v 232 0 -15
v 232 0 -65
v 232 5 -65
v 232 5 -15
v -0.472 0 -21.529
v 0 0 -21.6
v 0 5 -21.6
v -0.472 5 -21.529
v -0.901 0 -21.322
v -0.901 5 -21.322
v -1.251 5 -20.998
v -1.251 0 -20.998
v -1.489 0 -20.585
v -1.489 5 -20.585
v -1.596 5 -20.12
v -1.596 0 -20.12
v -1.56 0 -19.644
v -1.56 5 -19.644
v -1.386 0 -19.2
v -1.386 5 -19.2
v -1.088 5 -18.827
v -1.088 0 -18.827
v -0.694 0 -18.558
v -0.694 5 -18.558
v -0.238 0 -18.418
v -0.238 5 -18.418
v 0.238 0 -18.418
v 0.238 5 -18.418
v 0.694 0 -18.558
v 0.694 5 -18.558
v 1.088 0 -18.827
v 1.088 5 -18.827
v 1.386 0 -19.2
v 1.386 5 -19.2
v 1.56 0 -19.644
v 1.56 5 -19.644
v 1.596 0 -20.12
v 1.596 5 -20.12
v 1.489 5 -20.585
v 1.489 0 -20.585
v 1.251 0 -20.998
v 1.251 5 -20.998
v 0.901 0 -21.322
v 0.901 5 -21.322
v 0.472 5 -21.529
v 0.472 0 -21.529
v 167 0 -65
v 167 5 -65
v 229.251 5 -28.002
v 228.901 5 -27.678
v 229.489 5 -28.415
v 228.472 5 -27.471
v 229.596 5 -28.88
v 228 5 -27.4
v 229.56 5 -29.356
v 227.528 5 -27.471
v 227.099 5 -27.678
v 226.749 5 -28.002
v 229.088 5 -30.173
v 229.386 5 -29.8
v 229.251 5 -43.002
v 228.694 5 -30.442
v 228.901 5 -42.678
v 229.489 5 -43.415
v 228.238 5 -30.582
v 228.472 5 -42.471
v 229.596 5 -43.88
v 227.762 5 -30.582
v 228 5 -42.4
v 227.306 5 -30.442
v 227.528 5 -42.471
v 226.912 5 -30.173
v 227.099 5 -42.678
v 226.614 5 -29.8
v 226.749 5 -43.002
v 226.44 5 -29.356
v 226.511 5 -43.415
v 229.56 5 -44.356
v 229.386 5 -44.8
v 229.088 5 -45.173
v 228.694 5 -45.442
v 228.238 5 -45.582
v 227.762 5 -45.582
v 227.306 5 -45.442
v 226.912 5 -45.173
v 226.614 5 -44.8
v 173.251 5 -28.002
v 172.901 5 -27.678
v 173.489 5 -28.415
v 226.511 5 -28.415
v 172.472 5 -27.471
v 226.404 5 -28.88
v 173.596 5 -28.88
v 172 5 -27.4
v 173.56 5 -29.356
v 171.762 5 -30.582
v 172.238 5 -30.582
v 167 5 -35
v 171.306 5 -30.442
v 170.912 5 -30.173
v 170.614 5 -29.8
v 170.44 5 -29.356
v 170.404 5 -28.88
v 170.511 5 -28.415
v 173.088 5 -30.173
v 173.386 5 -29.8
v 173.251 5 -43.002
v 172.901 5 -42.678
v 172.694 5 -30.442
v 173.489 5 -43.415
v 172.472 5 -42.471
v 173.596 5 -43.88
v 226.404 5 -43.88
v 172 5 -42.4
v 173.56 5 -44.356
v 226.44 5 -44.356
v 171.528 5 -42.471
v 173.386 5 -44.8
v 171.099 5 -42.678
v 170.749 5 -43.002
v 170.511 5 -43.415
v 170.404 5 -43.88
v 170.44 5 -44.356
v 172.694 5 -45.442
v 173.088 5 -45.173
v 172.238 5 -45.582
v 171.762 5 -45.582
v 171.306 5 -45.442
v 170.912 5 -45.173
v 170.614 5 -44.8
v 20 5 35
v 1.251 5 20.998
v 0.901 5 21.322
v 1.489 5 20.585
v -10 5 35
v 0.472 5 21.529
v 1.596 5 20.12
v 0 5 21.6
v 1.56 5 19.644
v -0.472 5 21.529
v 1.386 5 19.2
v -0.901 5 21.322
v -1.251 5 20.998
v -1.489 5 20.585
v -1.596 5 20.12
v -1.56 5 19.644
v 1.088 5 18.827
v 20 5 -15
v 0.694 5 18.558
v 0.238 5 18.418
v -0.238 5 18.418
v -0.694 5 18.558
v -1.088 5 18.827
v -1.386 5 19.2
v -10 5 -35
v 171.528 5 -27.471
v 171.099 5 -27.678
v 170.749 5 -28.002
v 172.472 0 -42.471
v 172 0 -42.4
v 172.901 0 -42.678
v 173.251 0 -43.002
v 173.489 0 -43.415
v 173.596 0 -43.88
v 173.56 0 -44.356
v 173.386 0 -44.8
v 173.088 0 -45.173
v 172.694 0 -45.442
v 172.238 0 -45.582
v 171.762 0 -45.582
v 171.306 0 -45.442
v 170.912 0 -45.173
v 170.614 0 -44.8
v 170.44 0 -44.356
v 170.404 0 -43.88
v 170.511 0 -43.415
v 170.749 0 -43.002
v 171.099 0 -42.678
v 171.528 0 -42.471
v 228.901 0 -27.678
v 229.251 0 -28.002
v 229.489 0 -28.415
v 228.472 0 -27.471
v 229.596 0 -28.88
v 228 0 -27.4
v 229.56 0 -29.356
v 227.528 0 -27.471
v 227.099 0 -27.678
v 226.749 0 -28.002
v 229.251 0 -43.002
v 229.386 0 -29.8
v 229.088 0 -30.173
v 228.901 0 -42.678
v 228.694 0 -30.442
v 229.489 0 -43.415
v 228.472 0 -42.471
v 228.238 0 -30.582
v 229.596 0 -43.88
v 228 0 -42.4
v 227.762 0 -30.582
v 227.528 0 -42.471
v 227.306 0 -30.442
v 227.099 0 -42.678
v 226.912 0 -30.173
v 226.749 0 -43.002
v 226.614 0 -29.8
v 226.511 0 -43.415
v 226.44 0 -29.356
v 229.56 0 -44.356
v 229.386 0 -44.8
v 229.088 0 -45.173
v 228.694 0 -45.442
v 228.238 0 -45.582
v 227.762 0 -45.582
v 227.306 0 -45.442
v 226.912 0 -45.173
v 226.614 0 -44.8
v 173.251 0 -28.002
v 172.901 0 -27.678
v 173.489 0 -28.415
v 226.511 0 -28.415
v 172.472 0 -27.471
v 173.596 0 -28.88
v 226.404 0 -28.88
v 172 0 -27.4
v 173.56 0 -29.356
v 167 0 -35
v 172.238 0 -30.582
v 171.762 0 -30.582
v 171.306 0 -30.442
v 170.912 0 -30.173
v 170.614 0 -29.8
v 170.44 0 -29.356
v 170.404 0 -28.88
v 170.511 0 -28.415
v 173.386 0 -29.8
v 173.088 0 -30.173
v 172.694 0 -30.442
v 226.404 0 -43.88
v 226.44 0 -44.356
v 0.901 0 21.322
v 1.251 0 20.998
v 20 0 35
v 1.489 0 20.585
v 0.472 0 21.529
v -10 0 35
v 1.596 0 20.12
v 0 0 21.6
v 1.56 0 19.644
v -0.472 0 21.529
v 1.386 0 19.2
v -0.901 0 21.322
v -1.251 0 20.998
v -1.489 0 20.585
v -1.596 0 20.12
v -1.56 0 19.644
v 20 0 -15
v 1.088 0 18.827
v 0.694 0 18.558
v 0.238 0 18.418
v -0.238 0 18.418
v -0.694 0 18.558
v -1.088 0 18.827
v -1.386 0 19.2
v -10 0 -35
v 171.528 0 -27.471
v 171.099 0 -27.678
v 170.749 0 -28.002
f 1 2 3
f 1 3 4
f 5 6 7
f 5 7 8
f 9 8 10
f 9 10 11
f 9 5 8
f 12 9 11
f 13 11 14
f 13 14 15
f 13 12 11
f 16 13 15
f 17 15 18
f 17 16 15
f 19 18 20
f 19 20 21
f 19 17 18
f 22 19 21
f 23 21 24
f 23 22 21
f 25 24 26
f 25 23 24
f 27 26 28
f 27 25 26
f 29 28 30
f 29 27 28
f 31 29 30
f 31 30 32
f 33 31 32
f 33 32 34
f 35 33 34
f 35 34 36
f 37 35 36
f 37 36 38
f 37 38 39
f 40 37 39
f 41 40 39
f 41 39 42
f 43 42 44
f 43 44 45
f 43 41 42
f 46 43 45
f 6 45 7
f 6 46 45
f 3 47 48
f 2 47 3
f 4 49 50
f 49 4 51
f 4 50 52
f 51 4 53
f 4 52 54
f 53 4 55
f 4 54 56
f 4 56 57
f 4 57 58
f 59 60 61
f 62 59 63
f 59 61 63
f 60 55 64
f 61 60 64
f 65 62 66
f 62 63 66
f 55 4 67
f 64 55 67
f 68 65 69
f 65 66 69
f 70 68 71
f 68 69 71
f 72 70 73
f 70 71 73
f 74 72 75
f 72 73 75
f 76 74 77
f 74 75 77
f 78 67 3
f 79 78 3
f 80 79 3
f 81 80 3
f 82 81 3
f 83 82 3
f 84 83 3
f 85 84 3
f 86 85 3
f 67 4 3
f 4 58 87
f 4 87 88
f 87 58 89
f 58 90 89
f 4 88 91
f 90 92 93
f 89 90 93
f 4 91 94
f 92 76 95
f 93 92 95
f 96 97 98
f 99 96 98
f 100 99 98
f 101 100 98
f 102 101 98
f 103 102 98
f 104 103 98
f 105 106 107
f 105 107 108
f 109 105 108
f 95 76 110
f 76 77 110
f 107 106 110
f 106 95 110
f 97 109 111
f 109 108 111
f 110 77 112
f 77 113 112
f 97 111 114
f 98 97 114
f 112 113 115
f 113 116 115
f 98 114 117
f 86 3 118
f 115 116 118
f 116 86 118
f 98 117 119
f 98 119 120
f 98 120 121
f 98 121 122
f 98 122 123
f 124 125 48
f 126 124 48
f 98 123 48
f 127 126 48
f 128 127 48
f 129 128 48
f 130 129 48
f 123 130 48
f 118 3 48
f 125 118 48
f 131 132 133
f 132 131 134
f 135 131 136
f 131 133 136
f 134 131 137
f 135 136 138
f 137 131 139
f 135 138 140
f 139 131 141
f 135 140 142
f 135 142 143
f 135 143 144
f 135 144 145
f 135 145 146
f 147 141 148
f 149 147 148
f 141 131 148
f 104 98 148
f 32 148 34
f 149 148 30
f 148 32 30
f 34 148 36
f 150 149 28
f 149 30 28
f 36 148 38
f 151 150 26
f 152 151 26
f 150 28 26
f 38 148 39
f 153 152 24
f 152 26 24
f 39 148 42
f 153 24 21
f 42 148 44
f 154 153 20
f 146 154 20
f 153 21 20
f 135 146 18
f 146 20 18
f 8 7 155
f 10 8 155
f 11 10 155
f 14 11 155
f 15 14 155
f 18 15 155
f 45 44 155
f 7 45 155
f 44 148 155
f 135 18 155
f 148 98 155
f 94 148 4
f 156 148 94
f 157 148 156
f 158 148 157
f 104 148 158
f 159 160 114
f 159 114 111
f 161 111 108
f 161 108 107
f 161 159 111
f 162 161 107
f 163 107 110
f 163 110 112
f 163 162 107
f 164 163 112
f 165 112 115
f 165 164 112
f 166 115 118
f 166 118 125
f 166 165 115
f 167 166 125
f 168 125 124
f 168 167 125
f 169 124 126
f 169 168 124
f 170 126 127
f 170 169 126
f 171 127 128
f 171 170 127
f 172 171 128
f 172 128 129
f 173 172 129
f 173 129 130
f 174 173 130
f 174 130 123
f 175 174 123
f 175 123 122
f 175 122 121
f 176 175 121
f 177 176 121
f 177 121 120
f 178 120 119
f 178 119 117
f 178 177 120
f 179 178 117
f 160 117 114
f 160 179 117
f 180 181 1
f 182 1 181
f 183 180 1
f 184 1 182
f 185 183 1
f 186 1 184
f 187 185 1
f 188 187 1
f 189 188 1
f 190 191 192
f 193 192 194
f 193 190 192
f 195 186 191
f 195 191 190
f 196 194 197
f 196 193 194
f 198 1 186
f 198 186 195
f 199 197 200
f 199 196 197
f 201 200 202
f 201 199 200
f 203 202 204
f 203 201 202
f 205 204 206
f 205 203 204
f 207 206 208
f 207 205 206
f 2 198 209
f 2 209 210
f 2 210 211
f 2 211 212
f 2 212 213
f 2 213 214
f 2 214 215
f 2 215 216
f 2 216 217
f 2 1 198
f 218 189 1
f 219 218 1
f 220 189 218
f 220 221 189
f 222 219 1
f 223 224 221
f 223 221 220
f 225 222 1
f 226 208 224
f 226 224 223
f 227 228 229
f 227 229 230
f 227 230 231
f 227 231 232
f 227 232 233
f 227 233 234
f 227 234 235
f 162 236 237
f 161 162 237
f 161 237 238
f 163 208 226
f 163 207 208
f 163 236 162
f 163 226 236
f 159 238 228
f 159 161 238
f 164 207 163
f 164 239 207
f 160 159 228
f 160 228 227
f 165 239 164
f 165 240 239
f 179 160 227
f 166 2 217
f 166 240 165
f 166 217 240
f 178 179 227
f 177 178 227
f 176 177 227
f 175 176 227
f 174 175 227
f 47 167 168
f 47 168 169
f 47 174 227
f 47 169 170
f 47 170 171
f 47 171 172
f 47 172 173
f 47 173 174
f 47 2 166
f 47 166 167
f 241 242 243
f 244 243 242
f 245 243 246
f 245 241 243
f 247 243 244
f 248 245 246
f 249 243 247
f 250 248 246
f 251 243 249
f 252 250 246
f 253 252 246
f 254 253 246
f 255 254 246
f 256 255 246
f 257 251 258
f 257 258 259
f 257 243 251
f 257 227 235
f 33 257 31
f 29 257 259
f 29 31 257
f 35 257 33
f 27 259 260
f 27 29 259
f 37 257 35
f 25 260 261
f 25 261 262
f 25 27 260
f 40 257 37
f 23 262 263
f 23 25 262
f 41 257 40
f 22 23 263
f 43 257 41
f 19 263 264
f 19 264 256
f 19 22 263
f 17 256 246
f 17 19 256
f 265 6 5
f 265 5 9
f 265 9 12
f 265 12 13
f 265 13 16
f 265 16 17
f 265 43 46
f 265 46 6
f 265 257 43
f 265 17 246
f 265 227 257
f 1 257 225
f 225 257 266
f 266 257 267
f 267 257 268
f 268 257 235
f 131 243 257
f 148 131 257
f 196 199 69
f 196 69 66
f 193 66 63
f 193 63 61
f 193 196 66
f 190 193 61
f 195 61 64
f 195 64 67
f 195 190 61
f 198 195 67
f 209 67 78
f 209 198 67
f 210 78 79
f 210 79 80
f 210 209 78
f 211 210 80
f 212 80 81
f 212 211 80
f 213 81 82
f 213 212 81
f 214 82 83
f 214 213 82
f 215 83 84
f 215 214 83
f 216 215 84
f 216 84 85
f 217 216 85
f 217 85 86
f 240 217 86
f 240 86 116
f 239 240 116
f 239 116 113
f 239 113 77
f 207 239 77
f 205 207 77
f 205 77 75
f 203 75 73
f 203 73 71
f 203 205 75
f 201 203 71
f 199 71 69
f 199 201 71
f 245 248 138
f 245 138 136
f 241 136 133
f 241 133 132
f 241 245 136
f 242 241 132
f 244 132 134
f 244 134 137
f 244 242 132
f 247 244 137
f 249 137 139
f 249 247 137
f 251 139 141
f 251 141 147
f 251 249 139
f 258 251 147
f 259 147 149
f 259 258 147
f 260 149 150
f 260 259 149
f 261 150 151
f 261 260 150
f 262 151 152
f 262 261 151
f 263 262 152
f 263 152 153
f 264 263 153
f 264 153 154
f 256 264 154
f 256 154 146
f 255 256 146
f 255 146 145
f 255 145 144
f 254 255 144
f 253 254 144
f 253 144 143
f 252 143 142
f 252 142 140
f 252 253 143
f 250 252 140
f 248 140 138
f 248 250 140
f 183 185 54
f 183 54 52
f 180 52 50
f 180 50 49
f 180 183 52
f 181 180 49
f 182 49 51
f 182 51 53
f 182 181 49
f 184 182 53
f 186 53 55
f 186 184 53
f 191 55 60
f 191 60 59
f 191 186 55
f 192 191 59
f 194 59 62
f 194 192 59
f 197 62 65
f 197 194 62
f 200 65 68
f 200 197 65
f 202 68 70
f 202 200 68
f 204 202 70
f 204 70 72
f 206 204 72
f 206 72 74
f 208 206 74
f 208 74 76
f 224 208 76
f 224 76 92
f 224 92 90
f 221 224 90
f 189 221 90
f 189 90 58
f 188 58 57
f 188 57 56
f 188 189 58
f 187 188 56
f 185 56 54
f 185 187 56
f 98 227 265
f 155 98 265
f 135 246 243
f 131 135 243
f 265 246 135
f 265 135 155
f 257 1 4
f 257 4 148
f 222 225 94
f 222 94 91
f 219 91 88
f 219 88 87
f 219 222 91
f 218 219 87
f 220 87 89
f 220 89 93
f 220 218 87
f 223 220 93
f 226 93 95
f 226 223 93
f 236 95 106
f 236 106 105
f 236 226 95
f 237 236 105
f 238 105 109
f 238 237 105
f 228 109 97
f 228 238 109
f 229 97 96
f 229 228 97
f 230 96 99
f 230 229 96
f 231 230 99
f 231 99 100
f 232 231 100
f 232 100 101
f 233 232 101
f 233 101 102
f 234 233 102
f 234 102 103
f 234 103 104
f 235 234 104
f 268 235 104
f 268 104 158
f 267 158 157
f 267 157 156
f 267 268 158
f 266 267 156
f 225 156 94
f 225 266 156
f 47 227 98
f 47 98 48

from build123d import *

# Parameters (mm, degrees)
SKETCH_1_R      = 1.6
EXTRUDE_1_DEPTH = 5


with BuildPart() as part:
    # 草图1 → 凸台-拉伸1 (new body)
    with BuildSketch(Plane(origin=(0, 0, 0), x_dir=(1, 0, 0), z_dir=(0, 1, 0))):
        Polygon((-10, 35), (0, 35), (167, 35), (167, 65), (232, 65), (232, 15), (20, 15), (20, 0), (20, -35), (0, -35), (-10, -35), align=None)
        with Locations(Location((0, -20, 0), (0, 0, 270))):
            Circle(SKETCH_1_R, mode=Mode.SUBTRACT)
        with Locations(Location((0, 20, 0), (0, 0, 90))):
            Circle(SKETCH_1_R, mode=Mode.SUBTRACT)
        with Locations(Location((172, 29, 0), (0, 0, 270))):
            Circle(SKETCH_1_R, mode=Mode.SUBTRACT)
        with Locations(Location((172, 44, 0), (0, 0, 270))):
            Circle(SKETCH_1_R, mode=Mode.SUBTRACT)
        with Locations(Location((228, 29, 0), (0, 0, 270))):
            Circle(SKETCH_1_R, mode=Mode.SUBTRACT)
        with Locations(Location((228, 44, 0), (0, 0, 270))):
            Circle(SKETCH_1_R, mode=Mode.SUBTRACT)
    extrude(amount=EXTRUDE_1_DEPTH)


solid = part.part
